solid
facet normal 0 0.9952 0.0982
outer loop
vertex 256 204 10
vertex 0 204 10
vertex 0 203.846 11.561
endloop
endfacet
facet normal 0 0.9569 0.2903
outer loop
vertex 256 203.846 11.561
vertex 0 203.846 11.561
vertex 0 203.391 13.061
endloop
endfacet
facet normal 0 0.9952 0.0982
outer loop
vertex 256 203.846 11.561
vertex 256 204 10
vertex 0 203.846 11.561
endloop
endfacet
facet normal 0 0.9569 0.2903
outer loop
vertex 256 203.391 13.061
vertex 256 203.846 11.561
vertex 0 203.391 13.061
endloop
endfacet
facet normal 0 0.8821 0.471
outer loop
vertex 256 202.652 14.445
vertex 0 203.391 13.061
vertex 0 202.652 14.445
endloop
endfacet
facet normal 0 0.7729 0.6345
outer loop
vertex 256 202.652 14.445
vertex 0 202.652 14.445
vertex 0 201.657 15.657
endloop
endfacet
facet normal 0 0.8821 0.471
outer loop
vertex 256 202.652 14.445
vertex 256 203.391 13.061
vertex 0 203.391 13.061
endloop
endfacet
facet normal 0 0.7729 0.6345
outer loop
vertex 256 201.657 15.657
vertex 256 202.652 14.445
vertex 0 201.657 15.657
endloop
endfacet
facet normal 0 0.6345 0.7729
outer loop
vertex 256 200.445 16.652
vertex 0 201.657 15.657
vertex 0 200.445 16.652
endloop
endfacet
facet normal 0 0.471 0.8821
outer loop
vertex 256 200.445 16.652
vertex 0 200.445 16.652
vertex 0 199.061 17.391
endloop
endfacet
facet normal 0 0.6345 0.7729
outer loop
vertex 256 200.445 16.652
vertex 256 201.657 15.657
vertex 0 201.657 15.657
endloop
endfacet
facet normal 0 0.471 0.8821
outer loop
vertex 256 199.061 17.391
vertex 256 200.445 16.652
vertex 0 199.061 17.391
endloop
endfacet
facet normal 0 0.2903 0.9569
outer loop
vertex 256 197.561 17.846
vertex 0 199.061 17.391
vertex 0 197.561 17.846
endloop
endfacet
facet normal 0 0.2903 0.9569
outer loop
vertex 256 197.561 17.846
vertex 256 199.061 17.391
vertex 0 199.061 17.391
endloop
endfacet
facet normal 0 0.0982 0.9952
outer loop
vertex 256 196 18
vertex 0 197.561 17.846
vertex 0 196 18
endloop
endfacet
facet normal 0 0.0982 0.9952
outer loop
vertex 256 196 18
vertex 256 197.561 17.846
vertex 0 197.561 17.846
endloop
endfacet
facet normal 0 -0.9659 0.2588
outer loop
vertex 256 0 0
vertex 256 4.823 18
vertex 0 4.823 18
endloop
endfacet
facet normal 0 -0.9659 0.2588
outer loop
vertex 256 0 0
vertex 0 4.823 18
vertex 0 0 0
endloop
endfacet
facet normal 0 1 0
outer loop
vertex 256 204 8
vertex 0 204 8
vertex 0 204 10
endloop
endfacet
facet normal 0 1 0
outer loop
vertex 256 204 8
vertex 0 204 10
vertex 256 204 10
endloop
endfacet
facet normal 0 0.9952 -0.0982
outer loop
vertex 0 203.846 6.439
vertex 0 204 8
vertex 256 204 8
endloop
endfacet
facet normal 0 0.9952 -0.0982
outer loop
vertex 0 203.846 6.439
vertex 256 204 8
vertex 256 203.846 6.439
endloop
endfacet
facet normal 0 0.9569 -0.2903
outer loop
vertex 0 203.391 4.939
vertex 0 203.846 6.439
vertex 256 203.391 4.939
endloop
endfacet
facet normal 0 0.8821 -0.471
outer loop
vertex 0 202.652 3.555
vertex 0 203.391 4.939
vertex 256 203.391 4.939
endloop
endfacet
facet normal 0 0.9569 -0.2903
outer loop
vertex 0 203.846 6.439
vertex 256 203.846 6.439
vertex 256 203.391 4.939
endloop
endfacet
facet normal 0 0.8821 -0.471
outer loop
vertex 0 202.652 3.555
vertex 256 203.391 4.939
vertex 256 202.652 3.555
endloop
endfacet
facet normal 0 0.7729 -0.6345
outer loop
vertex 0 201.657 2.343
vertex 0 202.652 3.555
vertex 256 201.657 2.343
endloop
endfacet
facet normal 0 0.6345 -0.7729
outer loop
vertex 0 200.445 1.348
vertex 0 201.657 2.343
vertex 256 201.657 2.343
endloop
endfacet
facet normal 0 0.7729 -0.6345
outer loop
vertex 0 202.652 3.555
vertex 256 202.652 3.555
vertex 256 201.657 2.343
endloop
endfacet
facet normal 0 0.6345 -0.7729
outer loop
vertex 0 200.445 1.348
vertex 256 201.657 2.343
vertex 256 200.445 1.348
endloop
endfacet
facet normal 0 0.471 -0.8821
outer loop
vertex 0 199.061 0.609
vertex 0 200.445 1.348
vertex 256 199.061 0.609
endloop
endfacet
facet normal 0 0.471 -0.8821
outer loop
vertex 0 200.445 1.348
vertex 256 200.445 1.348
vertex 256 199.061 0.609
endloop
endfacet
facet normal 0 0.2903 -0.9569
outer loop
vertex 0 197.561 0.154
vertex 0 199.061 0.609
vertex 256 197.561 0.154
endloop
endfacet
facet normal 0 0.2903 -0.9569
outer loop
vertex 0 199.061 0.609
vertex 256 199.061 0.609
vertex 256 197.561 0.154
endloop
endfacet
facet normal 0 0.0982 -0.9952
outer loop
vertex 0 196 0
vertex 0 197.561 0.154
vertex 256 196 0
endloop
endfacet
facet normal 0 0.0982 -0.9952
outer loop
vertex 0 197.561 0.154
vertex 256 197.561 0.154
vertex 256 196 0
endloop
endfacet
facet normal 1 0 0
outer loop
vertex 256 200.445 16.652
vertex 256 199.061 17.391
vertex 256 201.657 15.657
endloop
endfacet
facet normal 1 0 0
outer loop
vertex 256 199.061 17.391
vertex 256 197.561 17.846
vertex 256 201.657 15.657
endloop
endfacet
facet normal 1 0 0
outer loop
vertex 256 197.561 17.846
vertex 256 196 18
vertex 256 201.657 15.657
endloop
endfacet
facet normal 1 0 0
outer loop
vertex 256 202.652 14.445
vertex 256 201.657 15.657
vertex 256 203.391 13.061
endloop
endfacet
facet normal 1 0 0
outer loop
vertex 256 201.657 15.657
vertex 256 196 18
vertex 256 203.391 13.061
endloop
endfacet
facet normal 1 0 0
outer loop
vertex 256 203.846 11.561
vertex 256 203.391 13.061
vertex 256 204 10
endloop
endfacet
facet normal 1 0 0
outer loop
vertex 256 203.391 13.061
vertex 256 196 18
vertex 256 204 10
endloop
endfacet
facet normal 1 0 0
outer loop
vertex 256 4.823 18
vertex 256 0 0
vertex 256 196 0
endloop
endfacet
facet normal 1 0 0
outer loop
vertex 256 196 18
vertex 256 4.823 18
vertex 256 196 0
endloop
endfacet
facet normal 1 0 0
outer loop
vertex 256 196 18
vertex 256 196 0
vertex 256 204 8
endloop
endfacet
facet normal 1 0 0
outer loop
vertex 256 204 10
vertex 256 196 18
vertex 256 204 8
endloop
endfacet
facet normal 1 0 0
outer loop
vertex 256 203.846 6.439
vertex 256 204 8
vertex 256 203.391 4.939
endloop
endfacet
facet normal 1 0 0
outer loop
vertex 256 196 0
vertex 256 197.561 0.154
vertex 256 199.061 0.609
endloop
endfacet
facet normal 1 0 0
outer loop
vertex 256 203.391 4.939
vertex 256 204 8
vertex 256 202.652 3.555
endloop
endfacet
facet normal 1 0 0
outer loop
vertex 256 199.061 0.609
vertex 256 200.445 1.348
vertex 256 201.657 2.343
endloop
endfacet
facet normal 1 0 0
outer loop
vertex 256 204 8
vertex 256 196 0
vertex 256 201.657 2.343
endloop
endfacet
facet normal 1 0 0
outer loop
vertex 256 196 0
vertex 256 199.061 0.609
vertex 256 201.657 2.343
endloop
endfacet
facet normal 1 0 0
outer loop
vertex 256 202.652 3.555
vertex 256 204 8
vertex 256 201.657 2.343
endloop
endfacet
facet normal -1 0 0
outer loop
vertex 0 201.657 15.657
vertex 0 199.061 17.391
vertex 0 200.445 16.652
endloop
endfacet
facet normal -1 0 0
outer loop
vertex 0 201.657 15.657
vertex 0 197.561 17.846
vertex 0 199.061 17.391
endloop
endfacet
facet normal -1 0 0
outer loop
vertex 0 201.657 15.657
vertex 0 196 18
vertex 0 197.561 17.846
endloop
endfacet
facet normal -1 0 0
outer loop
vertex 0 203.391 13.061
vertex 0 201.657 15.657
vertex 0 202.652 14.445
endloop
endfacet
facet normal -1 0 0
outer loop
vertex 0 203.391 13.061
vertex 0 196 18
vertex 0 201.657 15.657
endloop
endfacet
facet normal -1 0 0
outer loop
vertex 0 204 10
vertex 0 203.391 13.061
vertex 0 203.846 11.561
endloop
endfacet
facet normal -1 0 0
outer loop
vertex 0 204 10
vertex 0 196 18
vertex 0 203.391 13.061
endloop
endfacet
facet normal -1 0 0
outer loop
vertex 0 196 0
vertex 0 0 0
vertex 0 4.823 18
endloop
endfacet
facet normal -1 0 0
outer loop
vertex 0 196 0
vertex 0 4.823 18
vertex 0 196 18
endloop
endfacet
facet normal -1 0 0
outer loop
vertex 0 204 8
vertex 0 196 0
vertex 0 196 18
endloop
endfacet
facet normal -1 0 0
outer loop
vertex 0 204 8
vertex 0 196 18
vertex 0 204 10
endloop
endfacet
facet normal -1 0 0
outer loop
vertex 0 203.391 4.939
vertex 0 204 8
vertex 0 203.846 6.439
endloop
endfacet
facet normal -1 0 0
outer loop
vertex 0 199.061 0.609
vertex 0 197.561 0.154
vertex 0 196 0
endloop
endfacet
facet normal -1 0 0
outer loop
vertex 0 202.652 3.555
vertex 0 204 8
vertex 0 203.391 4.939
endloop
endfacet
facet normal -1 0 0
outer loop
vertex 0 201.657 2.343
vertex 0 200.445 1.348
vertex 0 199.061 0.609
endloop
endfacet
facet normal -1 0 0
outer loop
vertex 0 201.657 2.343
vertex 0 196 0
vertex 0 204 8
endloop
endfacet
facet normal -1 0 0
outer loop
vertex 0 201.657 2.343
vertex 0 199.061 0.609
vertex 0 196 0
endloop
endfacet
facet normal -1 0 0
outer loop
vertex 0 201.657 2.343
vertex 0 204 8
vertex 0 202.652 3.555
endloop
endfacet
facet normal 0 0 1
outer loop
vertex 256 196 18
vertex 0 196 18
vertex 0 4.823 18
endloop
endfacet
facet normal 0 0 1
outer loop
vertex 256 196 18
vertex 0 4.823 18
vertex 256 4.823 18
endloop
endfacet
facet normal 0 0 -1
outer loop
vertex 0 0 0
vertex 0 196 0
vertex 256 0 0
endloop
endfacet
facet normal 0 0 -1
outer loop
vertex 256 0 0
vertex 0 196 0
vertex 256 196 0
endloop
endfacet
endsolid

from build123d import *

# Parameters (mm, degrees)
ESQUISSE1_W                  = 256
ESQUISSE1_H                  = 204
BOSS_EXTRU_1_DEPTH           = 18
CONG_1_R                     = 8
ENL_V_MAT_EXTRU_2_DEPTH      = 328.835324515
ENL_V_MAT_EXTRU_2_DEPTH_BACK = 328.835324515


with BuildPart() as part:
    # Esquisse1 → Boss.-Extru.1 (new body)
    with BuildSketch(Plane.XY):
        with Locations((128, 102)):
            Rectangle(ESQUISSE1_W, ESQUISSE1_H)
    extrude(amount=BOSS_EXTRU_1_DEPTH)

    # Congé1
    cong_1_edges = [part.edges().sort_by_distance(p)[0] for p in [
        (128, 204, 18),
        (128, 204, 0),
    ]]
    fillet(cong_1_edges, radius=CONG_1_R)

    # Esquisse4 → Enlèv. mat.-Extru.2 (cut, two sides: drawn at the far end of the back side and taken through both)
    with BuildSketch(Plane(origin=(256, 0, 0), x_dir=(0, 0, -1), z_dir=(1, 0, 0)).offset(-ENL_V_MAT_EXTRU_2_DEPTH_BACK)):
        Polygon((0, 0), (-18, 0), (-18, 4.823085464), align=None)
    extrude(amount=ENL_V_MAT_EXTRU_2_DEPTH + ENL_V_MAT_EXTRU_2_DEPTH_BACK, mode=Mode.SUBTRACT)


solid = part.part
